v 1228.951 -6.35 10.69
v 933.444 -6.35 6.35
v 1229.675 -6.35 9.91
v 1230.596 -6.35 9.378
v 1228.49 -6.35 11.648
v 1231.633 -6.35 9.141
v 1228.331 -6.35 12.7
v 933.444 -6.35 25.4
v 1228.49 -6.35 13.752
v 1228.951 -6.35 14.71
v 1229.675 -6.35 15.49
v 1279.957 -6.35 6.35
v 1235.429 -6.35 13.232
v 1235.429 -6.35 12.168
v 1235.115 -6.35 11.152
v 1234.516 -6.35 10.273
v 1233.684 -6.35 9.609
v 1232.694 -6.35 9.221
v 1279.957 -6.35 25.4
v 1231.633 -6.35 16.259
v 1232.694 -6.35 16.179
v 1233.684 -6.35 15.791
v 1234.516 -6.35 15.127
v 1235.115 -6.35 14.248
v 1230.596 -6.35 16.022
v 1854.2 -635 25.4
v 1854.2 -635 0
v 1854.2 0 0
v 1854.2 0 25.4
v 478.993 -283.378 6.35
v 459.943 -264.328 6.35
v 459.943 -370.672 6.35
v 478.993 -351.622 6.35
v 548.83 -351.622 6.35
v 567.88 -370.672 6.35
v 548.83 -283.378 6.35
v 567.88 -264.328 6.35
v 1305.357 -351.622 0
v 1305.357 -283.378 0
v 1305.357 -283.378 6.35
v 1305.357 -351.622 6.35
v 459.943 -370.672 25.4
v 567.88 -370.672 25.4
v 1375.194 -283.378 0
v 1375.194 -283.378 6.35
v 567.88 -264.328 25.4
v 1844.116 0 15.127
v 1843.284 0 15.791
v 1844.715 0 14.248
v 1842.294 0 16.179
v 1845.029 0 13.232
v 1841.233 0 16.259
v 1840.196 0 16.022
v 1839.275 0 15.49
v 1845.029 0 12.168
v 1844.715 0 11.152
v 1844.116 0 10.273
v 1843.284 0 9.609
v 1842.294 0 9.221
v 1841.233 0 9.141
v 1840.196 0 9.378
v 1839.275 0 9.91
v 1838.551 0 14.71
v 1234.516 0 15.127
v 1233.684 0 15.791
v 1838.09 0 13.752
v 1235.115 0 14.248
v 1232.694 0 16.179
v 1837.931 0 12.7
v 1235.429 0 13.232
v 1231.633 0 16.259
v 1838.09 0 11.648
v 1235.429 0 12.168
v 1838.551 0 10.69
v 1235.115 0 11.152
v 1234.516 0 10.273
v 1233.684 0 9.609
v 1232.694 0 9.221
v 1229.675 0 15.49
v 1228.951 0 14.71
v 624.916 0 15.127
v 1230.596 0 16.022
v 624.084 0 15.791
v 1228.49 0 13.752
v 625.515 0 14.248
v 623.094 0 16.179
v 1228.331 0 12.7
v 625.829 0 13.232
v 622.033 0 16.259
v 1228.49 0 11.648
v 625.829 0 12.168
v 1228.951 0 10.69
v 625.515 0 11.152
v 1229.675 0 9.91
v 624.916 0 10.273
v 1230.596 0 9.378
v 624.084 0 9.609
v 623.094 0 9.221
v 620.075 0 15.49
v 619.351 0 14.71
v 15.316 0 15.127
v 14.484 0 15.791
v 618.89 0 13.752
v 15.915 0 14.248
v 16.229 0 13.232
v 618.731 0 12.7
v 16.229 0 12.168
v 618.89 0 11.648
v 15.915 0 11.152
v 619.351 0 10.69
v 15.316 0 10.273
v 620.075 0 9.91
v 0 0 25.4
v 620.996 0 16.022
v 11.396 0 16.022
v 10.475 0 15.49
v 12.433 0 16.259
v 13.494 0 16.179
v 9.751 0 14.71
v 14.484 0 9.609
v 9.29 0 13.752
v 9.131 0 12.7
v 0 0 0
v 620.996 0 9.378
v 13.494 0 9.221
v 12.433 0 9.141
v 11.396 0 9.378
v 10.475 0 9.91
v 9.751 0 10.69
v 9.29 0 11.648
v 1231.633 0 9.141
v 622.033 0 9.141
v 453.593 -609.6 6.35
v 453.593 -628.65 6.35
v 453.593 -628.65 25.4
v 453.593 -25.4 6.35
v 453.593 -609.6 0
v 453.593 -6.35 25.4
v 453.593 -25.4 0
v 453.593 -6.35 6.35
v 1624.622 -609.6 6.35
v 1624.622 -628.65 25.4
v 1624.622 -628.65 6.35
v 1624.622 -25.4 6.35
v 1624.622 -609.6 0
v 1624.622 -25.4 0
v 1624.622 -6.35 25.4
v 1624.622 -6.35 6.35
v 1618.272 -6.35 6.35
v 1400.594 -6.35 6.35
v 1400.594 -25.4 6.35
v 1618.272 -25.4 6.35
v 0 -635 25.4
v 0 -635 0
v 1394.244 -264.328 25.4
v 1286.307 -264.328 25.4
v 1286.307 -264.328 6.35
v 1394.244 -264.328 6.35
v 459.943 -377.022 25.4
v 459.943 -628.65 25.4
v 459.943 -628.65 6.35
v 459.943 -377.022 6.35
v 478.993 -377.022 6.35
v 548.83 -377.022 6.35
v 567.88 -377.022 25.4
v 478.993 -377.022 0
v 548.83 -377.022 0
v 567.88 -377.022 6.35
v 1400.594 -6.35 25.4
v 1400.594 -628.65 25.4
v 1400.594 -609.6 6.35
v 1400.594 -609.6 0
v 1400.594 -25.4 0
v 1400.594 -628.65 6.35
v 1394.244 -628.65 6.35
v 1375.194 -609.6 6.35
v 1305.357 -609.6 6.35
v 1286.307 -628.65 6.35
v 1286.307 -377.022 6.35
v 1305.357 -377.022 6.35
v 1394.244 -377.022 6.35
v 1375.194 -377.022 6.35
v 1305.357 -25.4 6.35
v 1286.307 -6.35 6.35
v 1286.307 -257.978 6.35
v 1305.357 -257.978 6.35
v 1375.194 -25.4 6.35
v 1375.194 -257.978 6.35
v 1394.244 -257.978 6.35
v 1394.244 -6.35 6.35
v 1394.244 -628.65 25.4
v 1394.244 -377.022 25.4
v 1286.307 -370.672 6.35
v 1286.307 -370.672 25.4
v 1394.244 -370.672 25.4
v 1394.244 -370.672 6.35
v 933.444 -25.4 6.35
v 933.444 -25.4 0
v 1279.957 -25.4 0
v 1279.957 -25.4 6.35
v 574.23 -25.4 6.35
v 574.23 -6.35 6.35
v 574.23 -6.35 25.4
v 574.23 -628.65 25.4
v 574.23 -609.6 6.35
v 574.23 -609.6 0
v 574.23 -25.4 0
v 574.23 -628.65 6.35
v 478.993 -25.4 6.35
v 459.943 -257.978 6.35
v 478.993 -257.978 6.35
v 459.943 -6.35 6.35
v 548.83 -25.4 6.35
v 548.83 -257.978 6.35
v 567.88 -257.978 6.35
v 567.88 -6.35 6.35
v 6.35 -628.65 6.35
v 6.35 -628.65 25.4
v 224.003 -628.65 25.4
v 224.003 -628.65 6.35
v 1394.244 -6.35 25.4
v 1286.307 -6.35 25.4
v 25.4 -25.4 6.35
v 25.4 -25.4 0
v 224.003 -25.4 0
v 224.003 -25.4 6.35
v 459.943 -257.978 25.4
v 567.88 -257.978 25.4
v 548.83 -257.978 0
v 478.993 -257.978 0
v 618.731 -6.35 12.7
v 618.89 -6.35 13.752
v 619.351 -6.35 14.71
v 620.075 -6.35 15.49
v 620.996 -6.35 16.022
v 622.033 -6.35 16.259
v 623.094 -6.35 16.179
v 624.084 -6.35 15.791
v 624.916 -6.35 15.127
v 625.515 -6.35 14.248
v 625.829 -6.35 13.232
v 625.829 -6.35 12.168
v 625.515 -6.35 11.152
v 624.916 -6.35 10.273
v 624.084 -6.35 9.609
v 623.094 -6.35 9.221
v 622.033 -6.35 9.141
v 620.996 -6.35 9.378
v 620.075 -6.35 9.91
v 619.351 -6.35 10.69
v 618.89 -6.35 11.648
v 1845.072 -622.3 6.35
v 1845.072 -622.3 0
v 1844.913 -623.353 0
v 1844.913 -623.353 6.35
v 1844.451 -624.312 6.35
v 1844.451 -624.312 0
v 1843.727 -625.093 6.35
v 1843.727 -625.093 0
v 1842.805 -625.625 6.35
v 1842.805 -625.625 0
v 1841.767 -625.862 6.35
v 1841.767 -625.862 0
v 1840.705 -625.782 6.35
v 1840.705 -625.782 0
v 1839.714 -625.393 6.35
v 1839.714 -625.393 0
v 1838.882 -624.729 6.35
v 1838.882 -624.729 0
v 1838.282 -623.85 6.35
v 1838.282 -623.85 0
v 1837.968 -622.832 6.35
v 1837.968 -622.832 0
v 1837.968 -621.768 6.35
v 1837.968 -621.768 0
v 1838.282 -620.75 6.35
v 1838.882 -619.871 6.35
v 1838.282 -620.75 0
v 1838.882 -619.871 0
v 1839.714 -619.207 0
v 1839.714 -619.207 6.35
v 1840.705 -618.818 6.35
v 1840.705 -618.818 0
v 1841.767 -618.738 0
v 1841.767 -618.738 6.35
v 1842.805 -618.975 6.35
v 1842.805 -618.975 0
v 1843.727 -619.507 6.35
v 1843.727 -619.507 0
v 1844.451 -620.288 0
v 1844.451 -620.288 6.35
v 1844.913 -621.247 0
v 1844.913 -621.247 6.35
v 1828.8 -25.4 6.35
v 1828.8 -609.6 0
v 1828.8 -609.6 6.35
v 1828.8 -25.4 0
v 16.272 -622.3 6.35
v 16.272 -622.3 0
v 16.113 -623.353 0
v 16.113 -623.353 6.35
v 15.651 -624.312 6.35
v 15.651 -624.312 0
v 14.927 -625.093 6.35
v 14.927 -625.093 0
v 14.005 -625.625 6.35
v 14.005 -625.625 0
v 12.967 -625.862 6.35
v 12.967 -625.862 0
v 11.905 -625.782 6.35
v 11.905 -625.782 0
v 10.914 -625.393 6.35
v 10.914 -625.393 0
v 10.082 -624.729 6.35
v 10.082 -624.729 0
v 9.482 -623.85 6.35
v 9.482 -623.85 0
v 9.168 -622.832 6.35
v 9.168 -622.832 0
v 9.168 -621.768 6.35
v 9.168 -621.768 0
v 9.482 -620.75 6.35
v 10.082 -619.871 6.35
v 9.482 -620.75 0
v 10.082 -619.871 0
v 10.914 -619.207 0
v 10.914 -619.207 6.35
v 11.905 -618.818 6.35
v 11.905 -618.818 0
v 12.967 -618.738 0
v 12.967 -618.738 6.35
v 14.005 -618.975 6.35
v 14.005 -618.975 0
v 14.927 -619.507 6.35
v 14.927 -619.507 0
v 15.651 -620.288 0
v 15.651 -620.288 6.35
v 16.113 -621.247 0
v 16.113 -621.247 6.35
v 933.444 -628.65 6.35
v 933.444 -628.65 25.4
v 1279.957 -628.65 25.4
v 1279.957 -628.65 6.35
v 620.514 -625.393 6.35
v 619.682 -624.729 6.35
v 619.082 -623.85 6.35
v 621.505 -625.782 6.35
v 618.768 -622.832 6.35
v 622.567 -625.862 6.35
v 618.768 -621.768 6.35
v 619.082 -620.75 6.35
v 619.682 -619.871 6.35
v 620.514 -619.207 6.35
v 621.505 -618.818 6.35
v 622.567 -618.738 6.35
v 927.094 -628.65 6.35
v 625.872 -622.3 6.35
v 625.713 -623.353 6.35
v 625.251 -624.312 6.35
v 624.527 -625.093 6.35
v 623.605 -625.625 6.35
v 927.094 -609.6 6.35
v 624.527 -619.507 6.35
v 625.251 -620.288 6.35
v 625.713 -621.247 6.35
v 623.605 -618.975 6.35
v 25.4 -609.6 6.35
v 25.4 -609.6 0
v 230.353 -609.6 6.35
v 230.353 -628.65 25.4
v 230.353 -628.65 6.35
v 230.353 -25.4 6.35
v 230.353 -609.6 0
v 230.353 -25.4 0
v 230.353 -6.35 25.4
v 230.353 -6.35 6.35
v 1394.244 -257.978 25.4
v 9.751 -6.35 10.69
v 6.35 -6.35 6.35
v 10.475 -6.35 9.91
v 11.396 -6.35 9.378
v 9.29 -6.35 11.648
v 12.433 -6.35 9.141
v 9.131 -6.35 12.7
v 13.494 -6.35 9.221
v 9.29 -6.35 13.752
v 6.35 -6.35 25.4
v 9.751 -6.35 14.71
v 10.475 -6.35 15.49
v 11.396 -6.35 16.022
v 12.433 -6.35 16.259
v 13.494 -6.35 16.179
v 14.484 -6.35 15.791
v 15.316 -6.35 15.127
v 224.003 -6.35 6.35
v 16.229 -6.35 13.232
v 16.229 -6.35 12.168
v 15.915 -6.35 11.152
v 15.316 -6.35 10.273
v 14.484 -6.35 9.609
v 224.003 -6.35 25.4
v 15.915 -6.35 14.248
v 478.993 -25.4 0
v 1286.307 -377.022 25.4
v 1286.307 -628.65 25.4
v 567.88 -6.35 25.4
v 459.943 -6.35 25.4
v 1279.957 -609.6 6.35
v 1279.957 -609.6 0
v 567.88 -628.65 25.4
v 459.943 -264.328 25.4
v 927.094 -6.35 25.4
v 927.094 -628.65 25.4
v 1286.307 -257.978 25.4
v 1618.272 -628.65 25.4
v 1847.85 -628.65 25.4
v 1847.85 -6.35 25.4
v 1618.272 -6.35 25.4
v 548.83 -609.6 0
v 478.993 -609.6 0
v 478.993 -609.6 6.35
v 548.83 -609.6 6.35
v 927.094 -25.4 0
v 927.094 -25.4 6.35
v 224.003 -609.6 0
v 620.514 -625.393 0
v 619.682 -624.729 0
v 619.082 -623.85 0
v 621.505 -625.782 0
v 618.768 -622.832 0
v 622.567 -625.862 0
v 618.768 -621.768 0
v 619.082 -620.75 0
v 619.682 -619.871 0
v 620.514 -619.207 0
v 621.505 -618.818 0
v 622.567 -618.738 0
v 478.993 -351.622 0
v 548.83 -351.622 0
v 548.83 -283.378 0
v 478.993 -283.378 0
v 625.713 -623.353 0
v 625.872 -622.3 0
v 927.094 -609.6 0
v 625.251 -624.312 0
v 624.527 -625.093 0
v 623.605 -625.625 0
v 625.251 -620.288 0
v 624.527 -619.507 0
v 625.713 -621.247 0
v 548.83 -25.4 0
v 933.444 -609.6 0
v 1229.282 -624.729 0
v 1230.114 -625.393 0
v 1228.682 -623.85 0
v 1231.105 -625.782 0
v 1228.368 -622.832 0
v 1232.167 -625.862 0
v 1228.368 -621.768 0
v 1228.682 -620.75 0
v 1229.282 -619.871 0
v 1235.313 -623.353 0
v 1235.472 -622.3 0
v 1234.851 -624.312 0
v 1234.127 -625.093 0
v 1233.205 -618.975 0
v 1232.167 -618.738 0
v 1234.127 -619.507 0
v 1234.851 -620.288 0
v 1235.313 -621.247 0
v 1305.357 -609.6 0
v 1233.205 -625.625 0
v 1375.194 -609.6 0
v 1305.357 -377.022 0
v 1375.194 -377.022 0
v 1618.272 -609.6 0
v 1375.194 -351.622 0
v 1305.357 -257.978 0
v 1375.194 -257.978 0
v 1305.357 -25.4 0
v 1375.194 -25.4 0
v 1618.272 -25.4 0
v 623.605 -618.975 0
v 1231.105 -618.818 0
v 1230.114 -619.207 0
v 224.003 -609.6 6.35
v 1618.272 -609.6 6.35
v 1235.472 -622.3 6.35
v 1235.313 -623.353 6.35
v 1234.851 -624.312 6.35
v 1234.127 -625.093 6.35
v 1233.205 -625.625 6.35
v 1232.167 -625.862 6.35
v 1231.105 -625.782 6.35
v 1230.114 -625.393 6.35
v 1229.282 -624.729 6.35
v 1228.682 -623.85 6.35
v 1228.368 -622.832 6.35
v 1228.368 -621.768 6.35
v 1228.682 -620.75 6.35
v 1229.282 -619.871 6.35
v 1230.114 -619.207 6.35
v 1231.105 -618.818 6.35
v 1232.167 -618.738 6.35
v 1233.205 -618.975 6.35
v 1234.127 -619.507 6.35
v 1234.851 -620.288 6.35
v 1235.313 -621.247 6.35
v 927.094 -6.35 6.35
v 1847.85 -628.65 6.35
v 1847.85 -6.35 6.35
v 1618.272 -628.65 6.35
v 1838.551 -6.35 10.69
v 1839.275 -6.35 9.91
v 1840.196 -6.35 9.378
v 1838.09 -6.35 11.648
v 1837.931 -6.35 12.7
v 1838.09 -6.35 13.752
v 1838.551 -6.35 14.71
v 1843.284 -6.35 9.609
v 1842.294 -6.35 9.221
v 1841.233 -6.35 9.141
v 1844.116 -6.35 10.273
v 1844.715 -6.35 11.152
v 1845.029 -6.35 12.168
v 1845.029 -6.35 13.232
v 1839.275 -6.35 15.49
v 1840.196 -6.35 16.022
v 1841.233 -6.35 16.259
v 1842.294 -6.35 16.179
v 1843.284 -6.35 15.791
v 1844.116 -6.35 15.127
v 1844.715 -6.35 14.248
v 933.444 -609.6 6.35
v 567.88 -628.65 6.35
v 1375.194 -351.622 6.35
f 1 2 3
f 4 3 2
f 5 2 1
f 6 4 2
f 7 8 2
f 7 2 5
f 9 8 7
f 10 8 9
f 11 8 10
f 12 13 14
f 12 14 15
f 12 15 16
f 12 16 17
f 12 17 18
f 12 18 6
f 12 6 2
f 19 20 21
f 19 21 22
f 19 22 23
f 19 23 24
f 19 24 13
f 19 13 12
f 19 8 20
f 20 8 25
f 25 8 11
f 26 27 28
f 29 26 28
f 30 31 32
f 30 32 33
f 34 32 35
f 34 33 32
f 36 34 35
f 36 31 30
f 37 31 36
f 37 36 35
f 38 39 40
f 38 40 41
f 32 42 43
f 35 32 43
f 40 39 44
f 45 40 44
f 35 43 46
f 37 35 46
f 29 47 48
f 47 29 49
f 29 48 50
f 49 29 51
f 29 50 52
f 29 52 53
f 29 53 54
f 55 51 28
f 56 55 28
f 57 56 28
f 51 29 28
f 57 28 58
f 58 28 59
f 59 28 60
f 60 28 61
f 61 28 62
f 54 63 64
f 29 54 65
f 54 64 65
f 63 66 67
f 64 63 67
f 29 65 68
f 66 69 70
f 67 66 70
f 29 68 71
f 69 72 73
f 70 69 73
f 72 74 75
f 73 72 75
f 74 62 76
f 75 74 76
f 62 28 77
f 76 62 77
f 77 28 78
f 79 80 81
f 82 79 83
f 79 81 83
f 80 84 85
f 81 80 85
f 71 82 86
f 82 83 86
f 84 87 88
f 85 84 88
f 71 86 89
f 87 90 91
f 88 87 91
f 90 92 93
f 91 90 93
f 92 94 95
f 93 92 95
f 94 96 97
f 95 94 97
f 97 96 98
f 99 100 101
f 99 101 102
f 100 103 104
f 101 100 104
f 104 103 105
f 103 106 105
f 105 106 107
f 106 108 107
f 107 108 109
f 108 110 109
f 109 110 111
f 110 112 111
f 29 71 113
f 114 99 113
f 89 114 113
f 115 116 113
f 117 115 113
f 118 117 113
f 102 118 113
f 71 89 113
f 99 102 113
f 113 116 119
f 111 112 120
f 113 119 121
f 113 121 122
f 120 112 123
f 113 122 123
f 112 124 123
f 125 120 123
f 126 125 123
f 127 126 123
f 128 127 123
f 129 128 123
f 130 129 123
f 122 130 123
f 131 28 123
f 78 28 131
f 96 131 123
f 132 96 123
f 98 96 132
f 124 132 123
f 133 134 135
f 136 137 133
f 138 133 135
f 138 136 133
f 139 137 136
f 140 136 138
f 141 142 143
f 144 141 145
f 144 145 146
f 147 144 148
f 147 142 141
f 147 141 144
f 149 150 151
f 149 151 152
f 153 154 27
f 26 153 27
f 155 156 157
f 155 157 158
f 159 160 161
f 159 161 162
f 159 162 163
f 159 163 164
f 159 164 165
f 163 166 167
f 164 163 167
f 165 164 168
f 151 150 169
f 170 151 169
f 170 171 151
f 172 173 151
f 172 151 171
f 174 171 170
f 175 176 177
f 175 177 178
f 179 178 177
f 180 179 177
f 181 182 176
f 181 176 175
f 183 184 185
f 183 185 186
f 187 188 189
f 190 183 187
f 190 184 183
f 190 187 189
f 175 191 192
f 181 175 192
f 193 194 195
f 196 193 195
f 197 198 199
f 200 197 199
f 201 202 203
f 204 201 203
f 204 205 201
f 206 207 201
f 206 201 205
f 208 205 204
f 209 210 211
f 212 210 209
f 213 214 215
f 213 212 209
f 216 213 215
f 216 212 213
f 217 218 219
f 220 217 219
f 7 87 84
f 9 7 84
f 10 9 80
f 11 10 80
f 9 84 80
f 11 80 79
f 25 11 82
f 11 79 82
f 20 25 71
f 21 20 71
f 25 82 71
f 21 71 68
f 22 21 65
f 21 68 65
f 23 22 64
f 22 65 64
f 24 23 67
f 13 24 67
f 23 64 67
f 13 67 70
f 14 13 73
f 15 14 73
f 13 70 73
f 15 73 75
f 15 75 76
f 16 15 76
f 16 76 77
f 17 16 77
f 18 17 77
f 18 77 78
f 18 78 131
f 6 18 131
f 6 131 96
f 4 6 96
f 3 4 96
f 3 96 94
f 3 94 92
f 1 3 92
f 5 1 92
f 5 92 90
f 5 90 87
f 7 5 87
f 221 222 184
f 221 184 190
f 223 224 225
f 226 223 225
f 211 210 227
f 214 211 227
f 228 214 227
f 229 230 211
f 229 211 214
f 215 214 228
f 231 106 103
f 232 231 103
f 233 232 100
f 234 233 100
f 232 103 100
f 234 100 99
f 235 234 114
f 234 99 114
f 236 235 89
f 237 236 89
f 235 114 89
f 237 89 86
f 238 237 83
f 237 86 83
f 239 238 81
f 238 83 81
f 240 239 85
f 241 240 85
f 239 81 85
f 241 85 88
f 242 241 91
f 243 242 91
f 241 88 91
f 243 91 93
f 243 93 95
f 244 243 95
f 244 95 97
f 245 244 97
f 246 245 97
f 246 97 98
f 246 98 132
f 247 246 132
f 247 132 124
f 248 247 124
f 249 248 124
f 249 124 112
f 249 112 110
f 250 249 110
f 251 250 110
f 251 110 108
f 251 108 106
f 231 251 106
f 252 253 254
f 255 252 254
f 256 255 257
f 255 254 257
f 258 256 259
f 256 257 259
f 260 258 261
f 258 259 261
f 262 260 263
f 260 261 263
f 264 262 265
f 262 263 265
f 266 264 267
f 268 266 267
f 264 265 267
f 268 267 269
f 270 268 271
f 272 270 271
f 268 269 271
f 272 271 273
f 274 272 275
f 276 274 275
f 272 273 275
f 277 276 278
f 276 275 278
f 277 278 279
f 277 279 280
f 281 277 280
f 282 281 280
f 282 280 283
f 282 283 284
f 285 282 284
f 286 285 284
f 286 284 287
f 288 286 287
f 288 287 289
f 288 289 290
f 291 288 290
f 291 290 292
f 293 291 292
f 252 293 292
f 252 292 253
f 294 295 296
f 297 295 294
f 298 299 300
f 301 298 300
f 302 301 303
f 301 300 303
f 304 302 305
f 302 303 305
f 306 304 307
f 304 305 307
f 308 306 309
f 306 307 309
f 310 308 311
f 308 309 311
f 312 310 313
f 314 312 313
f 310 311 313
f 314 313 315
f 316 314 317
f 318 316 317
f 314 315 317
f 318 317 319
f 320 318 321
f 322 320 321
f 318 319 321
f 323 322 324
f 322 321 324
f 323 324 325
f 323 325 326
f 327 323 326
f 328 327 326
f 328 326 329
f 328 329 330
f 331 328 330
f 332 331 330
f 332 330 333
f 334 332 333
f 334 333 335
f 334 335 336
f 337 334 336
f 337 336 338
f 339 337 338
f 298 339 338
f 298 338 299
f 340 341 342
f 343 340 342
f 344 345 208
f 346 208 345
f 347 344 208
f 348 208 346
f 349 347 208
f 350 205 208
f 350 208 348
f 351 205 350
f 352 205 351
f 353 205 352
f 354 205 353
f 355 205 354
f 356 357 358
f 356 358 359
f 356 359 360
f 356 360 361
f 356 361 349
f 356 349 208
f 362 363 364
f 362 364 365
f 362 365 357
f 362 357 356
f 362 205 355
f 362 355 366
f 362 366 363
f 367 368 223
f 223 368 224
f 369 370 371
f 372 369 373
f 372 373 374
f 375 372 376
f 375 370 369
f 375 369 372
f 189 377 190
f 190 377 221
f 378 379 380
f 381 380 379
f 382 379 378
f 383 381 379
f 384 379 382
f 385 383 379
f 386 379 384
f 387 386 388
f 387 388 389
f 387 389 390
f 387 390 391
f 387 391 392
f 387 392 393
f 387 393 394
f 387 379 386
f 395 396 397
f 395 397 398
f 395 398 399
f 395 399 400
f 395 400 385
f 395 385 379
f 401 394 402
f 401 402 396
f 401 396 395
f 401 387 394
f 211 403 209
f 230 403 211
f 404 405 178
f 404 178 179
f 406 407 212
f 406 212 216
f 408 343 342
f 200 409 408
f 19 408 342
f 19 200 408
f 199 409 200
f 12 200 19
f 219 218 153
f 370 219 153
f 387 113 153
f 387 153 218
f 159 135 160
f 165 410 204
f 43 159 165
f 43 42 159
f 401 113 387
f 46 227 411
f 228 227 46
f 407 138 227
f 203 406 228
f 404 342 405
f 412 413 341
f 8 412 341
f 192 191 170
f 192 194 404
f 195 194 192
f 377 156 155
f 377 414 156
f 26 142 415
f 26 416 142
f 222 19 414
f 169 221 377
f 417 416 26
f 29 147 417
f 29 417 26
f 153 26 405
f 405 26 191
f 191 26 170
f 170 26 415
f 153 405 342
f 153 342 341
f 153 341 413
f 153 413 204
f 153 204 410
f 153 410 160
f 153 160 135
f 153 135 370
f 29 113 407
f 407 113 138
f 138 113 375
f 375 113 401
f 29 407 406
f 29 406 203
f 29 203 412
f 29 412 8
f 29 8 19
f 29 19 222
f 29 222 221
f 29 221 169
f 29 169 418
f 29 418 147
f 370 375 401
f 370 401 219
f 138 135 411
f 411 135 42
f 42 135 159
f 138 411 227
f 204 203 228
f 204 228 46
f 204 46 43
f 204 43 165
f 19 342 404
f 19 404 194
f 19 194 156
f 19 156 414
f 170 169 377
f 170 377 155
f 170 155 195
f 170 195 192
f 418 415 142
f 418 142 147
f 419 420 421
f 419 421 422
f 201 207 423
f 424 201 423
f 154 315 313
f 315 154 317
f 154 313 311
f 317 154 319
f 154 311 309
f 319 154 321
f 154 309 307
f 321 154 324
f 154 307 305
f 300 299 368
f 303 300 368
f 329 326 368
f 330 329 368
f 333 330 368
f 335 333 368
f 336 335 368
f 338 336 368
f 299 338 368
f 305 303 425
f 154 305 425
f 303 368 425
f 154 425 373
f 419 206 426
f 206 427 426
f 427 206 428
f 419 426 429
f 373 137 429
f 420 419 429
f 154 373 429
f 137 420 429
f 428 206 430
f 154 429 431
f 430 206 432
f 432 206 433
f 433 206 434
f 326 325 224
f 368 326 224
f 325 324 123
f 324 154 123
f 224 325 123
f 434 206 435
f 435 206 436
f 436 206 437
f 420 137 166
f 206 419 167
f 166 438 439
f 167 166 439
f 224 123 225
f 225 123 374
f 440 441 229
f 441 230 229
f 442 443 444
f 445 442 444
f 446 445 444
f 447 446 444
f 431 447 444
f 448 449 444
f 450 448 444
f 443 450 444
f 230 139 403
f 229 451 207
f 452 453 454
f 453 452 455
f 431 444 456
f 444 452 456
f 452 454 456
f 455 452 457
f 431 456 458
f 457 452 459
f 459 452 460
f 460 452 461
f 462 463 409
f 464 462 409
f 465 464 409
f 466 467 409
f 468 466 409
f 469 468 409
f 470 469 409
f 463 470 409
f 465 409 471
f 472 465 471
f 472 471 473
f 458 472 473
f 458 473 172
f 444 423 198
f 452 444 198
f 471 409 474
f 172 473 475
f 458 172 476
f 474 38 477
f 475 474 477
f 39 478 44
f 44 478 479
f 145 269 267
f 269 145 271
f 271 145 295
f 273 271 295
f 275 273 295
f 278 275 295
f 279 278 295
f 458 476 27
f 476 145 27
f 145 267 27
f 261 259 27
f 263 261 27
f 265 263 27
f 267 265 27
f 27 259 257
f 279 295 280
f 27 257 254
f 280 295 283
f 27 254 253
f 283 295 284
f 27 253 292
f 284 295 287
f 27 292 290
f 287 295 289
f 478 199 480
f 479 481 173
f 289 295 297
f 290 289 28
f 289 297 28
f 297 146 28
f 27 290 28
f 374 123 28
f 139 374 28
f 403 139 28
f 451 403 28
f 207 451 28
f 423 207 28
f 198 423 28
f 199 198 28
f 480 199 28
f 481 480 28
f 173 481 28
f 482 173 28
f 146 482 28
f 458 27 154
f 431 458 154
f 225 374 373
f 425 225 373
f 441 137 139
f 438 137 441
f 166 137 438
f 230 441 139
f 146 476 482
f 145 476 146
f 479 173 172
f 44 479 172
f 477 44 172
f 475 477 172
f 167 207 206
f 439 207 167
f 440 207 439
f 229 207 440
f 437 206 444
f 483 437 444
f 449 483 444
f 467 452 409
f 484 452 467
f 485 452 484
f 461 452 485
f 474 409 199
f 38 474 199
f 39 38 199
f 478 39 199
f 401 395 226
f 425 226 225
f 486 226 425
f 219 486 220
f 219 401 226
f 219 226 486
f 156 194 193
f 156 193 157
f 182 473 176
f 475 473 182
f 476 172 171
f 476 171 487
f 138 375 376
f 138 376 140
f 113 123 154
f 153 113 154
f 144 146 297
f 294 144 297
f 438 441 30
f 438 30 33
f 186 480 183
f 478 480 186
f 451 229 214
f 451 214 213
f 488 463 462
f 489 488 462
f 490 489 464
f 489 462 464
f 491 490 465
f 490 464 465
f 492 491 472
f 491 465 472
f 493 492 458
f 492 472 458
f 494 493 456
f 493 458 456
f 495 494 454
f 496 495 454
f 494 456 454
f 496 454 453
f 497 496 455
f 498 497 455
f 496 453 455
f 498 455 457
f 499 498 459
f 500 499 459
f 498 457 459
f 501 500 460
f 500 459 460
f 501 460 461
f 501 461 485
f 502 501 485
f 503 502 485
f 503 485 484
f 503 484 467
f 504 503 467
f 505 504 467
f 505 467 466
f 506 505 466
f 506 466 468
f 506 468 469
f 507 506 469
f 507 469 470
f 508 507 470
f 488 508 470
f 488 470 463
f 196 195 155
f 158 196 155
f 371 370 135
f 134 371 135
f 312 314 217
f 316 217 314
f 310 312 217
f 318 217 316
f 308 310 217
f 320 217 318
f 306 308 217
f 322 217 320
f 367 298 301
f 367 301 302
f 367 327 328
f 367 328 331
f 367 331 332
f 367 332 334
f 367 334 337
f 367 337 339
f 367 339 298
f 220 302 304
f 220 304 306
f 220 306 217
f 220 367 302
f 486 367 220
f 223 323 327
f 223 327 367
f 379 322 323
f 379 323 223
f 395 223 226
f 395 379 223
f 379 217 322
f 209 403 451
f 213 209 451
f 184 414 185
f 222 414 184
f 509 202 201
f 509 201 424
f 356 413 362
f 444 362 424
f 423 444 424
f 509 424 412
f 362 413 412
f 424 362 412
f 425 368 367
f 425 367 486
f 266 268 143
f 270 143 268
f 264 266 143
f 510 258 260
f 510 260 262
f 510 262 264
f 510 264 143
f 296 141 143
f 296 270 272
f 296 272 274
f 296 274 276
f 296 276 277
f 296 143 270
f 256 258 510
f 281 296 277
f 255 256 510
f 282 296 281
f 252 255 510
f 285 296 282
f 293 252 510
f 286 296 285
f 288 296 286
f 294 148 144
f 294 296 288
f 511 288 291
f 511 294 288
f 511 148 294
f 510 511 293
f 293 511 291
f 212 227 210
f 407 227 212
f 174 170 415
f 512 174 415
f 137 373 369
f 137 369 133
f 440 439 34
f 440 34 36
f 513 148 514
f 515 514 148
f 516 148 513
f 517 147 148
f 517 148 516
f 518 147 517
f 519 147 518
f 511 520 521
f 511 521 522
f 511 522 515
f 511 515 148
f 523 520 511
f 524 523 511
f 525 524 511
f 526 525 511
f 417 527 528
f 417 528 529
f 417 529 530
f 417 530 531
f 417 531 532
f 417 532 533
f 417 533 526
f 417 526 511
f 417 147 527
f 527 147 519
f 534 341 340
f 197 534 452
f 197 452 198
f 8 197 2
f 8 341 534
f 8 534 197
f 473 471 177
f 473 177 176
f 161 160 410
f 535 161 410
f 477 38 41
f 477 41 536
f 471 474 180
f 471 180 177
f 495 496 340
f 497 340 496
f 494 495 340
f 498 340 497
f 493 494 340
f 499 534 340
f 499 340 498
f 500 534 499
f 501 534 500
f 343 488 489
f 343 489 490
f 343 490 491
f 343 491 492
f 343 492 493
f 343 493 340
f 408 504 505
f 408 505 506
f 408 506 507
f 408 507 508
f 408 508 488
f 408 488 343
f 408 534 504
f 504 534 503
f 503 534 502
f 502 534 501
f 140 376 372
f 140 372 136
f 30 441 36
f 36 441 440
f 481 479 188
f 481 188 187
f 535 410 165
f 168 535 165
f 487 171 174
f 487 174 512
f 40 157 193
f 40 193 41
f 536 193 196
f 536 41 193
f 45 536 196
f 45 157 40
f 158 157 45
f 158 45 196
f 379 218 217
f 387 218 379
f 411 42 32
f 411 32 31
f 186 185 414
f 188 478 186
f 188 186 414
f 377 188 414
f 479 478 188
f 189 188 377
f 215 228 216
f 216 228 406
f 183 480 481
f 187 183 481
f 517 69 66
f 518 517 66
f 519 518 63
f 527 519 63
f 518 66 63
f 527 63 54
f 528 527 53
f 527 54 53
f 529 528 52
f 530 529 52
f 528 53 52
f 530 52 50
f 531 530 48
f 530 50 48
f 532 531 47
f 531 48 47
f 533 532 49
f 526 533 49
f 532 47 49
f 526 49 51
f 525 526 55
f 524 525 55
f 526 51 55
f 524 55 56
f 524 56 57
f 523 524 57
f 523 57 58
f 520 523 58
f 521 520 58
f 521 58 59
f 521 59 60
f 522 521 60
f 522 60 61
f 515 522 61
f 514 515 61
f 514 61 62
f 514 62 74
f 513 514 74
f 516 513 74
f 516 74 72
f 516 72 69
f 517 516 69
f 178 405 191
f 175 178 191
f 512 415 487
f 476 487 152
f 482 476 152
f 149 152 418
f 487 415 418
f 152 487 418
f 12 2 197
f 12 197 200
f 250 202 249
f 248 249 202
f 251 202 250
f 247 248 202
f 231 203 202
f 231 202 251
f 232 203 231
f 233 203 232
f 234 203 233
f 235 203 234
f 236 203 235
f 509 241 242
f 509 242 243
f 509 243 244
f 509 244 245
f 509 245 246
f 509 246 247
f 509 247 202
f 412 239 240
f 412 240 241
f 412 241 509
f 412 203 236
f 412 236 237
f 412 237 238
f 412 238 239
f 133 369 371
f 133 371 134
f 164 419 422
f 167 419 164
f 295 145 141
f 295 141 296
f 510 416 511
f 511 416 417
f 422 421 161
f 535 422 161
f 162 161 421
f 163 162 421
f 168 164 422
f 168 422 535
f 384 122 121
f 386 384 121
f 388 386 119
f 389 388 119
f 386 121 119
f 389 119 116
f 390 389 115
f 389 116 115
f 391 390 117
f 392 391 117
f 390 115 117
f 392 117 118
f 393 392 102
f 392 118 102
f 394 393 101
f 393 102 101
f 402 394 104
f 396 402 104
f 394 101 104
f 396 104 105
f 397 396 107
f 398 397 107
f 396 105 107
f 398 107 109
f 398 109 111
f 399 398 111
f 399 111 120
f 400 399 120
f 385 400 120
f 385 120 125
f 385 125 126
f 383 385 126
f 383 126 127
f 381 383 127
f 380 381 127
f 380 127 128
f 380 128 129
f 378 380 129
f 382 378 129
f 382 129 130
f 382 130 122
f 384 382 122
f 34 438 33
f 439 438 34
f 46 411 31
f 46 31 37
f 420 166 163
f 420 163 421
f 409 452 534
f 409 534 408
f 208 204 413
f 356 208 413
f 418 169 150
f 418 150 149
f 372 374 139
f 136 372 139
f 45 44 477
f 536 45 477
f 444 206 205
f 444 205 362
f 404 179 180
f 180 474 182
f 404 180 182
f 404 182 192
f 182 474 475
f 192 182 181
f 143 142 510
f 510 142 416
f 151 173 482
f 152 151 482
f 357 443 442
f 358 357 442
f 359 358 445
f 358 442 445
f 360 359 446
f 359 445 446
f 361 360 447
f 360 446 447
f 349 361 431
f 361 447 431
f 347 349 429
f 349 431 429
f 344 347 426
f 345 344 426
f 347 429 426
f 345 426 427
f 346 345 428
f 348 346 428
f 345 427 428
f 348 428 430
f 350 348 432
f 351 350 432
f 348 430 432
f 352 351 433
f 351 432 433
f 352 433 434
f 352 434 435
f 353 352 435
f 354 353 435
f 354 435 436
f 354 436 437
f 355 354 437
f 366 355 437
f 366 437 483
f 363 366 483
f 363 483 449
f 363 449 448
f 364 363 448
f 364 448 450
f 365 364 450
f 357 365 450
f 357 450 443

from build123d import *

# Parameters (mm, degrees)
F0_W      = 25.4
F0_H      = 25.4
F0_W_2    = 1803.4
F0_H_2    = 584.2
F1_DEPTH  = 25.4
F2_W      = 1841.5
F2_H      = 622.3
F2_W_2    = 1803.4
F2_H_2    = 584.2
F3_DEPTH  = 19.05
F4_W      = 25.4
F4_H      = 232.57764
F4_H_2    = 25.4
F4_W_2    = 69.8373
F4_H_3    = 68.24472
F5_DEPTH  = 25.4
F6_W      = 19.05
F6_H      = 251.62764
F6_W_2    = 107.9373
F6_H_2    = 106.34472
F6_W_3    = 69.8373
F6_H_3    = 68.24472
F7_DEPTH  = 19.05
F8_R      = 3.571875
F9_DEPTH  = 25.4
F10_R     = 3.5687
F11_DEPTH = 25.4
F12_W     = 6.35
F12_H     = 622.3
F13_DEPTH = 25.4


# Not quite as in the source:
# - a feature names something its author has since deleted; it is built from what else it names


with BuildPart() as f1:
    # F0 (on Top) → F1 (new body)
    with BuildSketch(Plane.XY):
        with Locations((12.7, -12.7)):
            Rectangle(F0_W, F0_H)
        with Locations((927.1, -12.7)):
            Rectangle(F0_W_2, F0_H)
        with Locations((12.7, -317.5)):
            Rectangle(F0_W, F0_H_2)
        with Locations((1841.5, -12.7)):
            Rectangle(F0_W, F0_H)
        with Locations((12.7, -622.3)):
            Rectangle(F0_W, F0_H)
        with Locations((1841.5, -317.5)):
            Rectangle(F0_W, F0_H_2)
        with Locations((927.1, -622.3)):
            Rectangle(F0_W_2, F0_H)
        with Locations((1841.5, -622.3)):
            Rectangle(F0_W, F0_H)
    extrude(amount=F1_DEPTH)

    # F2 (on face) → F3 (cut)
    with BuildSketch(Plane.XY.offset(25.4)):
        with Locations((927.1, -317.5)):
            Rectangle(F2_W, F2_H)
        with Locations((927.1, -317.5)):
            Rectangle(F2_W_2, F2_H_2, mode=Mode.SUBTRACT)
    extrude(amount=-F3_DEPTH, mode=Mode.SUBTRACT)

    # F4 (on face) → F5 (join)
    with BuildSketch(Plane(origin=(0, 0, 0), x_dir=(1, 0, 0), z_dir=(0, 0, -1))):
        with Locations((466.2932, 493.31118)):
            Rectangle(F4_W, F4_H)
        with Locations((466.2932, 622.3)):
            Rectangle(F4_W, F4_H_2)
        with Locations((561.5305, 622.3)):
            Rectangle(F4_W, F4_H_2)
        with Locations((561.5305, 493.31118)):
            Rectangle(F4_W, F4_H)
        with Locations((561.5305, 364.32236)):
            Rectangle(F4_W, F4_H_2)
        with Locations((513.91185, 364.32236)):
            Rectangle(F4_W_2, F4_H_2)
        with Locations((466.2932, 364.32236)):
            Rectangle(F4_W, F4_H_2)
        with Locations((466.2932, 317.5)):
            Rectangle(F4_W, F4_H_3)
        with Locations((561.5305, 317.5)):
            Rectangle(F4_W, F4_H_3)
        with Locations((561.5305, 270.67764)):
            Rectangle(F4_W, F4_H_2)
        with Locations((513.91185, 270.67764)):
            Rectangle(F4_W_2, F4_H_2)
        with Locations((466.2932, 270.67764)):
            Rectangle(F4_W, F4_H_2)
        with Locations((466.2932, 141.68882)):
            Rectangle(F4_W, F4_H)
        with Locations((466.2932, 12.7)):
            Rectangle(F4_W, F4_H_2)
        with Locations((561.5305, 12.7)):
            Rectangle(F4_W, F4_H_2)
        with Locations((561.5305, 141.68882)):
            Rectangle(F4_W, F4_H)
        with Locations((1292.6568, 317.5)):
            Rectangle(F4_W, F4_H_3)
        with Locations((1292.6568, 622.3)):
            Rectangle(F4_W, F4_H_2)
        with Locations((1387.8941, 622.3)):
            Rectangle(F4_W, F4_H_2)
        with Locations((1292.6568, 493.31118)):
            Rectangle(F4_W, F4_H)
        with Locations((1387.8941, 493.31118)):
            Rectangle(F4_W, F4_H)
        with Locations((1340.27545, 364.32236)):
            Rectangle(F4_W_2, F4_H_2)
        with Locations((1387.8941, 317.5)):
            Rectangle(F4_W, F4_H_3)
        with Locations((1387.8941, 364.32236)):
            Rectangle(F4_W, F4_H_2)
        with Locations((1292.6568, 364.32236)):
            Rectangle(F4_W, F4_H_2)
        with Locations((1292.6568, 270.67764)):
            Rectangle(F4_W, F4_H_2)
        with Locations((1340.27545, 270.67764)):
            Rectangle(F4_W_2, F4_H_2)
        with Locations((1387.8941, 270.67764)):
            Rectangle(F4_W, F4_H_2)
        with Locations((1387.8941, 141.68882)):
            Rectangle(F4_W, F4_H)
        with Locations((1292.6568, 141.68882)):
            Rectangle(F4_W, F4_H)
        with Locations((1292.6568, 12.7)):
            Rectangle(F4_W, F4_H_2)
        with Locations((1387.8941, 12.7)):
            Rectangle(F4_W, F4_H_2)
    extrude(amount=-F5_DEPTH)

    # F6 (on face) → F7 (cut)
    with BuildSketch(Plane.XY.offset(25.4)):
        with Locations((1295.8318, -132.16382)):
            Rectangle(F6_W, F6_H)
        with Locations((1384.7191, -132.16382)):
            Rectangle(F6_W, F6_H)
        with Locations((1340.27545, -317.5)):
            Rectangle(F6_W_2, F6_H_2)
        with Locations((1340.27545, -317.5)):
            Rectangle(F6_W_3, F6_H_3, mode=Mode.SUBTRACT)
        with Locations((1384.7191, -502.83618)):
            Rectangle(F6_W, F6_H)
        with Locations((1295.8318, -502.83618)):
            Rectangle(F6_W, F6_H)
        with Locations((558.3555, -502.83618)):
            Rectangle(F6_W, F6_H)
        with Locations((469.4682, -502.83618)):
            Rectangle(F6_W, F6_H)
        with Locations((513.91185, -317.5)):
            Rectangle(F6_W_2, F6_H_2)
        with Locations((513.91185, -317.5)):
            Rectangle(F6_W_3, F6_H_3, mode=Mode.SUBTRACT)
        with Locations((469.4682, -132.16382)):
            Rectangle(F6_W, F6_H)
        with Locations((558.3555, -132.16382)):
            Rectangle(F6_W, F6_H)
    extrude(amount=-F7_DEPTH, mode=Mode.SUBTRACT)

    # F8 (on face) → F9 (cut)
    with BuildSketch(Plane(origin=(0, 0, 0), x_dir=(1, 0, 0), z_dir=(0, 0, -1))):
        with Locations((12.7, 622.3)):
            Circle(F8_R)
        with Locations((622.3, 622.3)):
            Circle(F8_R)
        with Locations((1231.9, 622.3)):
            Circle(F8_R)
        with Locations((1841.5, 622.3)):
            Circle(F8_R)
    extrude(amount=-F9_DEPTH, mode=Mode.SUBTRACT)

    # F10 (on face) → F11 (cut)
    with BuildSketch(Plane(origin=(0, 0, 0), x_dir=(-1, 0, 0), z_dir=(0, 1, 0))):
        with Locations((-1841.5, 12.7)):
            Circle(F10_R)
        with Locations((-1231.9, 12.7)):
            Circle(F10_R)
        with Locations((-622.3, 12.7)):
            Circle(F10_R)
        with Locations((-12.7, 12.7)):
            Circle(F10_R)
    extrude(amount=-F11_DEPTH, mode=Mode.SUBTRACT)

    # F12 (on face) → F13 (join)
    with BuildSketch(Plane.XY.offset(25.4)):
        Polygon((230.3526, -6.35), (229.5906, -6.35), (224.0026, -6.35), (224.0026, -628.65), (229.5906, -628.65), (230.3526, -628.65), align=None)
        with Locations((930.26865, -317.5)):
            Rectangle(F12_W, F12_H)
        with Locations((1621.4471, -317.5)):
            Rectangle(F12_W, F12_H)
    extrude(amount=-F13_DEPTH)


solid = f1.part
